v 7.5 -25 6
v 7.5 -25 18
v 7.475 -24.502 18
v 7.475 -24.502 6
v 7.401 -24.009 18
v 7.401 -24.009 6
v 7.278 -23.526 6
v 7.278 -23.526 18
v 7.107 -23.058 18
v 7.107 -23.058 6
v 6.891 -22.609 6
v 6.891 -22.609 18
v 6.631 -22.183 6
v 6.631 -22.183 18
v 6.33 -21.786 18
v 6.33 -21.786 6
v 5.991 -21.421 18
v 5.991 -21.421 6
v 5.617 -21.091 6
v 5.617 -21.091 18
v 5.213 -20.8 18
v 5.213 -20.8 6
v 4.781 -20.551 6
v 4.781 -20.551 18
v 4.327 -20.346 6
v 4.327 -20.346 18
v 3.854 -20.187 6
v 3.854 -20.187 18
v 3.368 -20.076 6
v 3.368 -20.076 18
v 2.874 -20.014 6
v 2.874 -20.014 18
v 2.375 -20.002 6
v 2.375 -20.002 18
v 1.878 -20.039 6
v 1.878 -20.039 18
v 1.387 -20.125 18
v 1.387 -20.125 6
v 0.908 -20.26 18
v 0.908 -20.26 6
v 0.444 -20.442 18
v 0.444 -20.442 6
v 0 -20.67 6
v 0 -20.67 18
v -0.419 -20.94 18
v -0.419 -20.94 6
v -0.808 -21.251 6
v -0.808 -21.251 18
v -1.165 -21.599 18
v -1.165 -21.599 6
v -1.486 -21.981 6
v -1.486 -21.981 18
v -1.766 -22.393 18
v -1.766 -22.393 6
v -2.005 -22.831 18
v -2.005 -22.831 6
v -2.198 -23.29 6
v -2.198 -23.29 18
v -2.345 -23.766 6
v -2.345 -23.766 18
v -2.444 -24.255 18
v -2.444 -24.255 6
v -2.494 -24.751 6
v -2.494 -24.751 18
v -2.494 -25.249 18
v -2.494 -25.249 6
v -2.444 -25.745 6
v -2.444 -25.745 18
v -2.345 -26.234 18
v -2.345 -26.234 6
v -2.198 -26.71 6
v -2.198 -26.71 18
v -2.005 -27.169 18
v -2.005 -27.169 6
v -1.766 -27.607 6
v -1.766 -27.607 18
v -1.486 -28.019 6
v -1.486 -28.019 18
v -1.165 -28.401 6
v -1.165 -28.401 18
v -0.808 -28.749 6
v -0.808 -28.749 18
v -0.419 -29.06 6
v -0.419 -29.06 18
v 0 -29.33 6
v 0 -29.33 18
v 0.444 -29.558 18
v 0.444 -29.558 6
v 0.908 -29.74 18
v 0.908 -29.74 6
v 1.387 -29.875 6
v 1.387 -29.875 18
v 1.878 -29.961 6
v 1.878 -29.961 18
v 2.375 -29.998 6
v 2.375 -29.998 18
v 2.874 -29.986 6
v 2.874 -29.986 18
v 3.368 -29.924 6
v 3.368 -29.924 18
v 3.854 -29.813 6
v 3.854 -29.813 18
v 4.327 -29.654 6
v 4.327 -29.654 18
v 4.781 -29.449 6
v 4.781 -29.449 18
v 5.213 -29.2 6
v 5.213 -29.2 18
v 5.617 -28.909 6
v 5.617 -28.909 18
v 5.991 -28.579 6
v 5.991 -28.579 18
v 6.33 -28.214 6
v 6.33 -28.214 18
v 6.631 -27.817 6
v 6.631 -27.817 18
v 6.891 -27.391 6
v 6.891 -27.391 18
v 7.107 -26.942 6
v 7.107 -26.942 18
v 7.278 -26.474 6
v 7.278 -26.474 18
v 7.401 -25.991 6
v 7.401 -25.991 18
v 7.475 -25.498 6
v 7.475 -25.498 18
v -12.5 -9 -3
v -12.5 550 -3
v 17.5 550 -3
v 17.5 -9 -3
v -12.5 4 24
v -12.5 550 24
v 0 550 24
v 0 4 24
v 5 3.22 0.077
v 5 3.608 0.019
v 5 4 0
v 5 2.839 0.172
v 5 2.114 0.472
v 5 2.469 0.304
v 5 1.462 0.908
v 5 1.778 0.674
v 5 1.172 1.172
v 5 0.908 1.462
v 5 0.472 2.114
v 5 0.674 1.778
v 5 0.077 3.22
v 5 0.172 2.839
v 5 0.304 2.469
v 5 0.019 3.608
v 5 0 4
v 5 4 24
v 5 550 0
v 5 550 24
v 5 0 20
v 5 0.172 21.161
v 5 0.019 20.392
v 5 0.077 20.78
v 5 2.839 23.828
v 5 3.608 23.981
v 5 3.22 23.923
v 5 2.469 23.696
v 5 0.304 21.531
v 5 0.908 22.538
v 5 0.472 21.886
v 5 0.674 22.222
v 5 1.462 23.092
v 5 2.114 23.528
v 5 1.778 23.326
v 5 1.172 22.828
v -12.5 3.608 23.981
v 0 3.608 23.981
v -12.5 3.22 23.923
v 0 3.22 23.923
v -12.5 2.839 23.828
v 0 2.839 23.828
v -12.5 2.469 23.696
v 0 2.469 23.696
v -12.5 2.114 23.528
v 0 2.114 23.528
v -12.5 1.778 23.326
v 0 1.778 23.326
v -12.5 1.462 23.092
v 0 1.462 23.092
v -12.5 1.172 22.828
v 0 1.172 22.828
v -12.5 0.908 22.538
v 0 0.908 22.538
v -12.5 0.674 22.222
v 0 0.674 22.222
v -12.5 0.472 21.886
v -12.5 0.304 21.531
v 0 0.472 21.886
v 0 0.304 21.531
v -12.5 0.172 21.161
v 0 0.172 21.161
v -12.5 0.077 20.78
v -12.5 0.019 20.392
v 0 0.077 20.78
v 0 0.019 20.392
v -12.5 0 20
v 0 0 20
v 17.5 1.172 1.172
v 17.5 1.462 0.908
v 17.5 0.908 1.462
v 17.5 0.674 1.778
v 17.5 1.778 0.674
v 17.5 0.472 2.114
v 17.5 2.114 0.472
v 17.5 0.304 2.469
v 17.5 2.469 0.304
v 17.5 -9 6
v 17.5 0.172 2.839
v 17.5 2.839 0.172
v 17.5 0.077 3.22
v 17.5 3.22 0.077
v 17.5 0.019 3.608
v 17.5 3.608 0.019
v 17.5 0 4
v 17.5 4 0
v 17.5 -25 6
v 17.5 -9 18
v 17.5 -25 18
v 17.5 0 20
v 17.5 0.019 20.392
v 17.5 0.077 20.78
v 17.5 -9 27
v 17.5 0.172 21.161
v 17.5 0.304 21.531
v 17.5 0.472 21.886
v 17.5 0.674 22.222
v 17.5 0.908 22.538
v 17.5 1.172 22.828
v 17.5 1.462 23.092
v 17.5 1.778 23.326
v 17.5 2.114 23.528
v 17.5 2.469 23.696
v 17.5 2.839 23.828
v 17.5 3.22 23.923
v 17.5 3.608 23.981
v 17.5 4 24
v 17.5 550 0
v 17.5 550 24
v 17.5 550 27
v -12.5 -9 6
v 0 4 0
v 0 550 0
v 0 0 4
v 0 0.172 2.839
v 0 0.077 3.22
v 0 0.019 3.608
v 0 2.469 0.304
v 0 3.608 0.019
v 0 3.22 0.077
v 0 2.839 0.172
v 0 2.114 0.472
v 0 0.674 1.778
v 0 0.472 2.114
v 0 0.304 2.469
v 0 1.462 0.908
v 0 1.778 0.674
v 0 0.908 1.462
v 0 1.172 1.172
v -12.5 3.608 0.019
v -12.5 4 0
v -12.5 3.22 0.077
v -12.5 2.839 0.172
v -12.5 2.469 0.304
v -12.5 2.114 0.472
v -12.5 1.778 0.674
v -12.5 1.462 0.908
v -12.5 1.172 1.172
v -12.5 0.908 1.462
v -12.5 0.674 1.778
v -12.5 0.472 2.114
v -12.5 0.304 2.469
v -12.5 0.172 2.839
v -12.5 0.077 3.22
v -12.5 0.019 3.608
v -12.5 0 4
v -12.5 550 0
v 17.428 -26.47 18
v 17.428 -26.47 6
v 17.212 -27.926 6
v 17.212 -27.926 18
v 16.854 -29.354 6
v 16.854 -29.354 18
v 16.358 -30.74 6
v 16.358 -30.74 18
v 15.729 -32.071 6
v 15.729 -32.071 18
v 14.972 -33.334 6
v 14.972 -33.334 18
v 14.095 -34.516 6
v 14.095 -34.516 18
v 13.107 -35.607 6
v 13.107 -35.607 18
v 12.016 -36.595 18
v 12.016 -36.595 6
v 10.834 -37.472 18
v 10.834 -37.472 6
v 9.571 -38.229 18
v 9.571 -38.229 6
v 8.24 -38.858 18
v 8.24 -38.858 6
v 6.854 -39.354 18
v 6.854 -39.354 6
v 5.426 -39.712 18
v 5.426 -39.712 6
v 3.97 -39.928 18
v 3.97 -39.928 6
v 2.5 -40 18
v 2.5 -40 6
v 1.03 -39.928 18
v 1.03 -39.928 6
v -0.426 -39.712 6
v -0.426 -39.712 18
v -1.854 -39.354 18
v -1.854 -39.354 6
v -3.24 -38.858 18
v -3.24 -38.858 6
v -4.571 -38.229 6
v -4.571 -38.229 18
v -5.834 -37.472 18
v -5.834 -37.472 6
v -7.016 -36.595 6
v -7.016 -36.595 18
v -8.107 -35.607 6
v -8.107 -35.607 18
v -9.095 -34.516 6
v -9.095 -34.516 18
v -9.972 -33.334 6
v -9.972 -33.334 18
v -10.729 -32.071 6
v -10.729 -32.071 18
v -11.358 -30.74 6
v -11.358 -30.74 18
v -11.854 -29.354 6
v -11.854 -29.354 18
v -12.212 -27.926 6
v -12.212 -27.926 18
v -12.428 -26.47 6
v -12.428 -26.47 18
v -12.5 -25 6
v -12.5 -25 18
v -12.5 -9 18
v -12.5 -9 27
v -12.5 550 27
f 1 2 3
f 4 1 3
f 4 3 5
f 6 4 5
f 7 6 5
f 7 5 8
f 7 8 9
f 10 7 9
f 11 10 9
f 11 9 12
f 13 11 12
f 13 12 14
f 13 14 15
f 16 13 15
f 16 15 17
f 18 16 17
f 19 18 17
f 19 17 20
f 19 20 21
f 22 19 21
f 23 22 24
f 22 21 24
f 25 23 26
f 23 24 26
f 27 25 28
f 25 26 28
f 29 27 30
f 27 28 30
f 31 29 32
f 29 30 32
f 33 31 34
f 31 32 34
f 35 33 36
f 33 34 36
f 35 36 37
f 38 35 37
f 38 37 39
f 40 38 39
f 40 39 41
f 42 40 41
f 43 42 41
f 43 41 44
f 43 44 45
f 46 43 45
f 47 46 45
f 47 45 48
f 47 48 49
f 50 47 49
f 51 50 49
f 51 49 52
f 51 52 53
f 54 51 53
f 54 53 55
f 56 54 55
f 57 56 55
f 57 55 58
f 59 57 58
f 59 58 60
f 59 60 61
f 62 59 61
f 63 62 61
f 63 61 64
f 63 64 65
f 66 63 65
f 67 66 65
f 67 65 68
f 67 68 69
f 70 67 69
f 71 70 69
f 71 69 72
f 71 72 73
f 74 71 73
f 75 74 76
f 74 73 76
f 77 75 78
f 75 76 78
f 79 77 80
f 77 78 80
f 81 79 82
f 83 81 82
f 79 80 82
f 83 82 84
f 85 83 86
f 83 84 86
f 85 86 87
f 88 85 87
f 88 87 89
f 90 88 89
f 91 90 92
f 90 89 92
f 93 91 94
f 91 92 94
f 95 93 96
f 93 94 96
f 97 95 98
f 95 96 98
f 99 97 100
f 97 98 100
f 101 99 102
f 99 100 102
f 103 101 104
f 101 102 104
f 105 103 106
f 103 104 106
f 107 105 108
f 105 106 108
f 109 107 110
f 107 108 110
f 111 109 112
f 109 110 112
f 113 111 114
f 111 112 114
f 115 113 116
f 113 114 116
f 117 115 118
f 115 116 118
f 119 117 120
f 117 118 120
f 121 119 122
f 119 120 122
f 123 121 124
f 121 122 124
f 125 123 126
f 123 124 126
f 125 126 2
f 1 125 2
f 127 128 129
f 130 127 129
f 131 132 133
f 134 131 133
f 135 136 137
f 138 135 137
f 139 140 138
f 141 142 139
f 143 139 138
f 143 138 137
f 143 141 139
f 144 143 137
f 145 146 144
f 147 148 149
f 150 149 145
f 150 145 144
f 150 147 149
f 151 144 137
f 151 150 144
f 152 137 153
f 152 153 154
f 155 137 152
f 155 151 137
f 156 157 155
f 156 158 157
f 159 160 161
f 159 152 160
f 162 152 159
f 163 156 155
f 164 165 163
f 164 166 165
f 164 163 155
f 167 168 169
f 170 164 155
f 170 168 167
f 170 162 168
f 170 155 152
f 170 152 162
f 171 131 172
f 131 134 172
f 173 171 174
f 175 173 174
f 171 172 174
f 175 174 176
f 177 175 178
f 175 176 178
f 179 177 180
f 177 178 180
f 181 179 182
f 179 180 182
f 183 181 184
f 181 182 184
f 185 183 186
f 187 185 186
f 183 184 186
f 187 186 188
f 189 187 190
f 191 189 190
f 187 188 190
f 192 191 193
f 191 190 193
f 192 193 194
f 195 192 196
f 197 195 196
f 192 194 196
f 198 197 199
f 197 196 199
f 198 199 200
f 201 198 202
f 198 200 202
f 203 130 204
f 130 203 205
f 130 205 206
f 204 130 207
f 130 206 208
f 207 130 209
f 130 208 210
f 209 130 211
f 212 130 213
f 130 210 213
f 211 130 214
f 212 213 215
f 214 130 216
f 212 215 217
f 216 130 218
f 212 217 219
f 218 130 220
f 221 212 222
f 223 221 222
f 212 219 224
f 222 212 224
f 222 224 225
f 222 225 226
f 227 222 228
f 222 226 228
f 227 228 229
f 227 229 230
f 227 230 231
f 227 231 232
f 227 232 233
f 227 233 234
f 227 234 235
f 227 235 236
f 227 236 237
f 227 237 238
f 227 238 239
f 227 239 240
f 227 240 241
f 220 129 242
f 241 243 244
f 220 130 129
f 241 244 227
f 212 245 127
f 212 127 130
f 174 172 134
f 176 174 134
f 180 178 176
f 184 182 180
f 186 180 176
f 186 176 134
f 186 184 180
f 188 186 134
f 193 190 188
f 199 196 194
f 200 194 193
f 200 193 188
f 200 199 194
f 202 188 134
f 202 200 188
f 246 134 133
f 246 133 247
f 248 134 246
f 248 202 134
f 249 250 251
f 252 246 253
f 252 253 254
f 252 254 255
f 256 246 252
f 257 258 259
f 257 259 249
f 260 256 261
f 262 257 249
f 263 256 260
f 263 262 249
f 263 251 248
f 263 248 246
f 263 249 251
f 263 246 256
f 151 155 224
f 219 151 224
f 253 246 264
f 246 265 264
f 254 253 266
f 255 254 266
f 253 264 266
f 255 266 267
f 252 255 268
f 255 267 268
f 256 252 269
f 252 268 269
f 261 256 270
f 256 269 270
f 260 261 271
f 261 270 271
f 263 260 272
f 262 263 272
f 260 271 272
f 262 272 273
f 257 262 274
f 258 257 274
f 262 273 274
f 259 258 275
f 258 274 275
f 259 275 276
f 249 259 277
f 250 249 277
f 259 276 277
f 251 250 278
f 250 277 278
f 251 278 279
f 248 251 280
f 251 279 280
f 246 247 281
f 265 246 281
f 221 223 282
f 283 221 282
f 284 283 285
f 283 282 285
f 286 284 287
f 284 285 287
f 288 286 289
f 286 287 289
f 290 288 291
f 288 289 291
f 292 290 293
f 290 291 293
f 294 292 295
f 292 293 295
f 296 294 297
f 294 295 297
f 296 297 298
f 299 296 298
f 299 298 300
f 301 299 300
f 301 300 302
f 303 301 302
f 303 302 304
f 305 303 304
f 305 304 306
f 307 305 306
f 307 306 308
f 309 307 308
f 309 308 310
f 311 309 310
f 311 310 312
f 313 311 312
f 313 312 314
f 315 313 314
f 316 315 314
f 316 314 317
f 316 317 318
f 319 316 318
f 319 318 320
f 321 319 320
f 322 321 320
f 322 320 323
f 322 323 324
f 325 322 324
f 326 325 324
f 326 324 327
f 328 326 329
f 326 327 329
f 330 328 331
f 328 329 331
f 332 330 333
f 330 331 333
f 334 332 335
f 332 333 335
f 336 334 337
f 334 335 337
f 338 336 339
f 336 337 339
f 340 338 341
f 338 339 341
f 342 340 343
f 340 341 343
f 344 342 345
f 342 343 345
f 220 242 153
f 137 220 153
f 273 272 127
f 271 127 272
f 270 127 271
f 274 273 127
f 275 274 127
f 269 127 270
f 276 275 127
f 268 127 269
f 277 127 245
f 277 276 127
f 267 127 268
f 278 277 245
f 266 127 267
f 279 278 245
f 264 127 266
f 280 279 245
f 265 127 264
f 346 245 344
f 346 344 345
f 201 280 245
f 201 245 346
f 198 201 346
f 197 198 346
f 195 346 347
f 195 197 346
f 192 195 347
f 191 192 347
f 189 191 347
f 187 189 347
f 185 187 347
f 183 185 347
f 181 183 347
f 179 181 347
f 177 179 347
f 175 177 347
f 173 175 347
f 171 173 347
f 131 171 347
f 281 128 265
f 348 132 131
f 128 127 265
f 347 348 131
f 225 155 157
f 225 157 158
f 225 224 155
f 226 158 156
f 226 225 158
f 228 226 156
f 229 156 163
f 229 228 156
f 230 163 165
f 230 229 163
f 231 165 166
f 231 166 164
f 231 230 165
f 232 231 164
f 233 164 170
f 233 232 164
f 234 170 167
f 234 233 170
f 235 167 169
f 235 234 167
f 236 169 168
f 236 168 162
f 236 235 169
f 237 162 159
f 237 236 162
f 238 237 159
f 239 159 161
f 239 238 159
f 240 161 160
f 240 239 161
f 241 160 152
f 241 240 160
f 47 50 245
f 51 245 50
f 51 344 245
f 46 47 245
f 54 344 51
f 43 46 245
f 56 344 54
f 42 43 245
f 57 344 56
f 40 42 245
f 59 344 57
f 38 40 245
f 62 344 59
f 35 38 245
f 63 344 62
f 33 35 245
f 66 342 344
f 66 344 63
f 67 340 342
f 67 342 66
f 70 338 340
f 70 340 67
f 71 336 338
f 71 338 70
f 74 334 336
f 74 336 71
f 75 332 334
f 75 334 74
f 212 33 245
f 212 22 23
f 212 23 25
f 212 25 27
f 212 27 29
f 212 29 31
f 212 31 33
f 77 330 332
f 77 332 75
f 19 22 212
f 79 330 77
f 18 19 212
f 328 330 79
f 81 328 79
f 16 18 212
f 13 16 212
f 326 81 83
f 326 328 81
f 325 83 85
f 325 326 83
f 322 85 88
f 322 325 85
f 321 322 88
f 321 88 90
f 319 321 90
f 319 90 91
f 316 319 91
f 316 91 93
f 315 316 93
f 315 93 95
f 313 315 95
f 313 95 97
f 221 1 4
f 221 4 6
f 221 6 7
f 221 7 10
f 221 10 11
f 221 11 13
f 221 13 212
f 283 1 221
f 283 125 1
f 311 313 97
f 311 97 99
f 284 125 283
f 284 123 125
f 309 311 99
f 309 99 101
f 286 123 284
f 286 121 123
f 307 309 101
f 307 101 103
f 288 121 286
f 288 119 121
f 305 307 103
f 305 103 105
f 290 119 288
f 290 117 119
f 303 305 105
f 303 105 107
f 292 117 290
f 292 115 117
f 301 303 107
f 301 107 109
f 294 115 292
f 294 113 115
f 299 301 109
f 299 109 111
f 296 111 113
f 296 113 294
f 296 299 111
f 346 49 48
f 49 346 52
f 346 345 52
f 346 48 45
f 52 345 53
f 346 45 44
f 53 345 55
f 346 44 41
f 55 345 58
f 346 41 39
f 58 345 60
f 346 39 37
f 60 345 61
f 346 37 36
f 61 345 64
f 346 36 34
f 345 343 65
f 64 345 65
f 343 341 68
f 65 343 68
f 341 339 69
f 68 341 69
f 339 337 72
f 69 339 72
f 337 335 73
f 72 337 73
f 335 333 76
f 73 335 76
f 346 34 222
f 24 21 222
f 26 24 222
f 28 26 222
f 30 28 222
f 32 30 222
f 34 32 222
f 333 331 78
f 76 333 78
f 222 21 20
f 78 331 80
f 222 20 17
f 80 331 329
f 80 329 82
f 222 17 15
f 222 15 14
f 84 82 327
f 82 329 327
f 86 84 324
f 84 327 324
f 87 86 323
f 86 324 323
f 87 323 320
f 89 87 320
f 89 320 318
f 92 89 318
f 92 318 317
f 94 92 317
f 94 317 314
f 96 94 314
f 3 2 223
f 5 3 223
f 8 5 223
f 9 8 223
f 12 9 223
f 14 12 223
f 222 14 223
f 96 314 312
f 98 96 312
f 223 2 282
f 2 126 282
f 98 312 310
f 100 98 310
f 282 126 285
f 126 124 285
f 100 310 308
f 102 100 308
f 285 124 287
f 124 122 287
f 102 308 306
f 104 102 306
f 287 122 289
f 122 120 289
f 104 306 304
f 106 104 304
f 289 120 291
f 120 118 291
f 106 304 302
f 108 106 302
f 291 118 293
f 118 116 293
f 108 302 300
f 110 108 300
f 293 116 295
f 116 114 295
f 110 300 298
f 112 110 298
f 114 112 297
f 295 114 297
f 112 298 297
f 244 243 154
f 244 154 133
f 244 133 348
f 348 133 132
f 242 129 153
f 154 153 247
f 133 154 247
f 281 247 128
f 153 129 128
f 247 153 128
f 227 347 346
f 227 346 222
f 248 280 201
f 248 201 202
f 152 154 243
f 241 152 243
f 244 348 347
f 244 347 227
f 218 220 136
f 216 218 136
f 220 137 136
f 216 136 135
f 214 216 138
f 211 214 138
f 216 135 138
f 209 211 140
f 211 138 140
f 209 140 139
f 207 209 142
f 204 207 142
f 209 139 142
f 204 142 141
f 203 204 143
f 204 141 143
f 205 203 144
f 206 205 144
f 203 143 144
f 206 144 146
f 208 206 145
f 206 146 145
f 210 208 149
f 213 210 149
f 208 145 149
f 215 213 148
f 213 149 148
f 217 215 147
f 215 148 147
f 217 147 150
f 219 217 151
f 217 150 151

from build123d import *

# Parameters (mm, degrees)
EXTRUDE4_DEPTH     = 550
SKETCH4_W          = 30
SKETCH4_H          = 30
EXTRUDE5_DEPTH     = 40
SKETCH5_W          = 30
SKETCH5_H          = 9
CUT_EXTRUDE2_DEPTH = 31
SKETCH6_R          = 5
CUT_EXTRUDE3_DEPTH = 551.678899178
SKETCH7_OUTSIDE_W  = 150.304
SKETCH7_OUTSIDE_H  = 710.304
CUT_EXTRUDE4_DEPTH = 551.678899178
FILLET2_R          = 4
FILLET3_R          = 4


with BuildPart() as part:
    # Sketch1 → Extrude4 (new body)
    with BuildSketch(Plane(origin=(0, 0, 0), x_dir=(1, 0, 0), z_dir=(0, 1, 0))):
        Polygon((-12.5, 3), (17.5, 3), (17.5, 0), (5, 0), (5, -24), (17.5, -24), (17.5, -27), (-12.5, -27), (-12.5, -24), (0, -24), (0, 0), (-12.5, 0), align=None)
    extrude(amount=EXTRUDE4_DEPTH)

    # Sketch4 → Extrude5 (add)
    with BuildSketch(Plane.XZ):
        with Locations((2.5, 12)):
            Rectangle(SKETCH4_W, SKETCH4_H)
    extrude(amount=EXTRUDE5_DEPTH)

    # Sketch5 → Cut-Extrude2 (cut)
    with BuildSketch(Plane.XZ.offset(40)):
        with Locations((2.5, 1.5)):
            Rectangle(SKETCH5_W, SKETCH5_H)
        with Locations((2.5, 22.5)):
            Rectangle(SKETCH5_W, SKETCH5_H)
    extrude(amount=-CUT_EXTRUDE2_DEPTH, mode=Mode.SUBTRACT)

    # Sketch6 → Cut-Extrude3 (cut, through all)
    with BuildSketch(Plane.XY.offset(18)):
        with Locations((2.5, -25)):
            Circle(SKETCH6_R)
    extrude(amount=-CUT_EXTRUDE3_DEPTH, mode=Mode.SUBTRACT)

    # Sketch7 outside → Cut-Extrude4 (cut, through all)
    with BuildSketch(Plane.XY.offset(18)):
        with Locations((2.5, 255)):
            Rectangle(SKETCH7_OUTSIDE_W, SKETCH7_OUTSIDE_H)
        with BuildLine():
            Line((-12.5, 573.573250903), (17.5, 573.573250903))
            Line((17.5, 573.573250903), (17.5, -25))
            ThreePointArc((17.5, -25), (2.5, -40), (-12.5, -25))
            Line((-12.5, -25), (-12.5, 573.573250903))
        make_face(mode=Mode.SUBTRACT)
    extrude(amount=-CUT_EXTRUDE4_DEPTH, mode=Mode.SUBTRACT)

    # Fillet2
    fillet2_edges = [part.edges().sort_by_distance(p)[0] for p in [
        (11.25, 0, 24),
        (11.25, 0, 0),
    ]]
    fillet(fillet2_edges, radius=FILLET2_R)

    # Fillet3
    fillet3_edges = [part.edges().sort_by_distance(p)[0] for p in [
        (-6.25, 0, 0),
        (-6.25, 0, 24),
    ]]
    fillet(fillet3_edges, radius=FILLET3_R)


solid = part.part
